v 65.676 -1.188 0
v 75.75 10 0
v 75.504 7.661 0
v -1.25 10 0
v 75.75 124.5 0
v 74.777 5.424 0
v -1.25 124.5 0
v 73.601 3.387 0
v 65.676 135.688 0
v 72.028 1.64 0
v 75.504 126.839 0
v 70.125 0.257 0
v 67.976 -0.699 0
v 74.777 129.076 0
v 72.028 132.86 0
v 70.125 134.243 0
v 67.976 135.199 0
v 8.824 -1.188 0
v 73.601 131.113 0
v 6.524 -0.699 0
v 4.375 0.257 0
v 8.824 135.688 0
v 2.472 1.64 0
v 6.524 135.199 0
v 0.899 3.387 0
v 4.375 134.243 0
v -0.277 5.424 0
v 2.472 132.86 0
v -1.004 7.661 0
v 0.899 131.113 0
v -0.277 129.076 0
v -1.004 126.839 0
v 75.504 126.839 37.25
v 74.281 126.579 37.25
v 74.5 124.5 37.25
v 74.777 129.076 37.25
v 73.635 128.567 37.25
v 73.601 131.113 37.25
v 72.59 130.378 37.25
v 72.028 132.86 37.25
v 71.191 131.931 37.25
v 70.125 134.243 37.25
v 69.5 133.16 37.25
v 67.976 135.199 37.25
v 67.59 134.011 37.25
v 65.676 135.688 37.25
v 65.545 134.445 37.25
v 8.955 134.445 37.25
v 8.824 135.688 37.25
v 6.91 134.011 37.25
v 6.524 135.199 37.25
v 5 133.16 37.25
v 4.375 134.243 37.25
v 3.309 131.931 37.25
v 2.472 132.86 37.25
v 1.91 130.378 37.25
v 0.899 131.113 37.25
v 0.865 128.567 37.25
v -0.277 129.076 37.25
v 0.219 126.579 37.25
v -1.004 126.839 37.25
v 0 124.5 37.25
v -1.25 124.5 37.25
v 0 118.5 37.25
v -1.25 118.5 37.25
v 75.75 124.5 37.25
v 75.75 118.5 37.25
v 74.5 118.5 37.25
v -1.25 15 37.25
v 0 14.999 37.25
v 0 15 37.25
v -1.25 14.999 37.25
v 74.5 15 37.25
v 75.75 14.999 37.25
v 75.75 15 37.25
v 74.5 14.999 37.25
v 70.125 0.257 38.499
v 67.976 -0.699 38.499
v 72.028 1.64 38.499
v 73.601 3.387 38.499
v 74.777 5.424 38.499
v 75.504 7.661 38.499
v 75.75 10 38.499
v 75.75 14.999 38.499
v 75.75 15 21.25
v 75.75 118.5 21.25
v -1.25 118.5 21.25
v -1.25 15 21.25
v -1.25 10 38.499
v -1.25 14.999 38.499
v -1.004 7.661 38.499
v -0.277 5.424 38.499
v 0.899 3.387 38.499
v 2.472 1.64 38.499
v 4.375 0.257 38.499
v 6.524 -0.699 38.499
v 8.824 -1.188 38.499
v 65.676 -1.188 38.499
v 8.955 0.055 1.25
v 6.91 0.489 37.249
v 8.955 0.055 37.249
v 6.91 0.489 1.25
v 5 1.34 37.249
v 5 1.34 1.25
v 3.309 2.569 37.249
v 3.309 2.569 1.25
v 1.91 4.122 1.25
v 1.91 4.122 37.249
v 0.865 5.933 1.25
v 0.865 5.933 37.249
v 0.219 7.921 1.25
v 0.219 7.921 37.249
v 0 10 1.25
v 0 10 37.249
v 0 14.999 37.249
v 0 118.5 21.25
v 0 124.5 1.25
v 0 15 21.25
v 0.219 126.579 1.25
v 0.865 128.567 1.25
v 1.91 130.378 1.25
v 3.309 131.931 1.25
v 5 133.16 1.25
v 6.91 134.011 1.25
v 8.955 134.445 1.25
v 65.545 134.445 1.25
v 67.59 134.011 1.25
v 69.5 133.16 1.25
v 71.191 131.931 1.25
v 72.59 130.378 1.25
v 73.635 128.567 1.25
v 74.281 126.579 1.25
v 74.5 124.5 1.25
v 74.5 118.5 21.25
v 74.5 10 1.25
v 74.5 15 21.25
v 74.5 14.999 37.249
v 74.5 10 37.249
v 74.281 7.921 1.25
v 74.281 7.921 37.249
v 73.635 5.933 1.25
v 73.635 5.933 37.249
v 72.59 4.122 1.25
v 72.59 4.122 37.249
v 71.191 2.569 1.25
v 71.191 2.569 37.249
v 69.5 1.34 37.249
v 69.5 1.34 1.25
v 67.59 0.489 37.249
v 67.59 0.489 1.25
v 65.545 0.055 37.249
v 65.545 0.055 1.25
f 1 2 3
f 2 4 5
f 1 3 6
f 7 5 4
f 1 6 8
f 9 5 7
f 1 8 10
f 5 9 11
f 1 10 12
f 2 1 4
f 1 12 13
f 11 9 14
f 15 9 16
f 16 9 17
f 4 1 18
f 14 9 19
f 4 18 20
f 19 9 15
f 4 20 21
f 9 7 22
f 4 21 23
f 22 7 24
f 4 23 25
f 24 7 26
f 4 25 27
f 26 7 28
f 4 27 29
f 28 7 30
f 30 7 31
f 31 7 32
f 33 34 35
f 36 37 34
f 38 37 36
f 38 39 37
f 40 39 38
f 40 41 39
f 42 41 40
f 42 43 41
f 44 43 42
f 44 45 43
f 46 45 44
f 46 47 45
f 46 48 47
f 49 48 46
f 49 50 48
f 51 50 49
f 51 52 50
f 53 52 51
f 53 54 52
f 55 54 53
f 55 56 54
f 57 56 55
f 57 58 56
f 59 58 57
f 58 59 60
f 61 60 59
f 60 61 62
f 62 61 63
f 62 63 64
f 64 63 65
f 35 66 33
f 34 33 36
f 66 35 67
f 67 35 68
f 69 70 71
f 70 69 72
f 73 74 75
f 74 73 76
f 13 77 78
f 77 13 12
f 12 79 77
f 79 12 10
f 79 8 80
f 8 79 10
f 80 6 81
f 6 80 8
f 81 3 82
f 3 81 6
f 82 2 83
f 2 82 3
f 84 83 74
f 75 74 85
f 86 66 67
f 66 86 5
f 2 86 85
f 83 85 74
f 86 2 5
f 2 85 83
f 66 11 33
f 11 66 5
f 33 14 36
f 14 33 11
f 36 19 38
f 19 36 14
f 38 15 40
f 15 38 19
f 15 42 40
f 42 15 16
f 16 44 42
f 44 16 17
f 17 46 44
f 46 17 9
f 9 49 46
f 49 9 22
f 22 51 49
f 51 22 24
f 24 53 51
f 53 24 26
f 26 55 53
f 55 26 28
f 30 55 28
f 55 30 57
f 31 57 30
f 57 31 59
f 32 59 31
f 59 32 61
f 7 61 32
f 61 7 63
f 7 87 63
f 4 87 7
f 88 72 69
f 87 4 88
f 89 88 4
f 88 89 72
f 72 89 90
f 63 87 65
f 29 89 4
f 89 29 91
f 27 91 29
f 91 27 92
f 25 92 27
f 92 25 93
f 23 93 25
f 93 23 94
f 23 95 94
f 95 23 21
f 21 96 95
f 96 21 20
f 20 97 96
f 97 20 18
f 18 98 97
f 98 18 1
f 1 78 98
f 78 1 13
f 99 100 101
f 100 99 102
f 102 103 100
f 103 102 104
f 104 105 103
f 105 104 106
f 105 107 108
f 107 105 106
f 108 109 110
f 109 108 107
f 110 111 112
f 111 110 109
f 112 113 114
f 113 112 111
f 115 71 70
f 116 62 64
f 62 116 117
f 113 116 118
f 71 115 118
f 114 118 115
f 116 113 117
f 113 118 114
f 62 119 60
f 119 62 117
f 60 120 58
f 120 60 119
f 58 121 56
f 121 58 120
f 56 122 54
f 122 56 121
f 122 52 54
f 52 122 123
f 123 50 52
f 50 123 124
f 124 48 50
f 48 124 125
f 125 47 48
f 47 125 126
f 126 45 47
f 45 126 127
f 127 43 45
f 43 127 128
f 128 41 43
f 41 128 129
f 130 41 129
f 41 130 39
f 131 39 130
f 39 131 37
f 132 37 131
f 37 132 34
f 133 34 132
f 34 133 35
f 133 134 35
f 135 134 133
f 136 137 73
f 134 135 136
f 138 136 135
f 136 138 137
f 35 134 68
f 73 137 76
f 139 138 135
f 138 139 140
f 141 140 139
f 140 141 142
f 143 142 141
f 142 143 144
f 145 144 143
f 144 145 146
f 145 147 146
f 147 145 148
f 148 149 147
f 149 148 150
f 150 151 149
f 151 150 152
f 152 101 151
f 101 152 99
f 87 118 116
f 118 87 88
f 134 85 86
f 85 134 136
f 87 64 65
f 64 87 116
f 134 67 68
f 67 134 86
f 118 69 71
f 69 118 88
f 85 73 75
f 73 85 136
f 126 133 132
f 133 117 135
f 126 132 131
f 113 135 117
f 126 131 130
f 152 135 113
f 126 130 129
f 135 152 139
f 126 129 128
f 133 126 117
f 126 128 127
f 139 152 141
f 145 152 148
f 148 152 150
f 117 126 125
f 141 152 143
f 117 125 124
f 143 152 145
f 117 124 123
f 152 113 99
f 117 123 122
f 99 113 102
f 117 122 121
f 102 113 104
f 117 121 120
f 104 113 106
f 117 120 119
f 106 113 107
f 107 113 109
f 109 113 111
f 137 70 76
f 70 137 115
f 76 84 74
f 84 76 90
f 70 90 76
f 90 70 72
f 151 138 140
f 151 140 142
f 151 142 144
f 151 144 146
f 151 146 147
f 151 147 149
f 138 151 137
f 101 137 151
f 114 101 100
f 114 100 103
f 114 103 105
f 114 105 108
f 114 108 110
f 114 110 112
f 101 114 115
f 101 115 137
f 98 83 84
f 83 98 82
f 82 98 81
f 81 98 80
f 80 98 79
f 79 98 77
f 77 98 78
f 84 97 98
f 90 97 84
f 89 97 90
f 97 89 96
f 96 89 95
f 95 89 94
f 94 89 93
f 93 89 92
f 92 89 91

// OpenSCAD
width = 74.5;
height = 134.5;
phoneThickness = 16;
concreteThickness = 20;
wall = 1.25;
cornerRadius = 10;
topStickout = 16;
bottomCover = 15;
nudge = 0.001;

module oval(extra=0) {
    r = cornerRadius + extra;
    w = width + 2 * extra;
    h = height + 2 * extra;
    translate([-extra,-extra])
    hull() {
        for (x=[0,1])
            for (y=[0,1])
                translate([r+x*(w-2*r),r+y*(h-2*r)]) circle(r=r);
    }
}

linear_extrude(height=wall)
oval(extra=wall);
difference() {
    linear_extrude(height=concreteThickness+phoneThickness+wall) difference() {
        oval(extra=wall);
        oval();
    }
    translate([-wall-nudge,bottomCover,wall+concreteThickness])
    cube([width+4*wall, height-topStickout-bottomCover,phoneThickness+nudge]);
}
translate([0,0,concreteThickness+phoneThickness+wall-nudge])
linear_extrude(height=wall) {
    intersection() {
        oval(extra=wall);
        translate([-wall-nudge,-wall-nudge]) square([width + 2*wall + 2*nudge, bottomCover + wall]);
    }
}
